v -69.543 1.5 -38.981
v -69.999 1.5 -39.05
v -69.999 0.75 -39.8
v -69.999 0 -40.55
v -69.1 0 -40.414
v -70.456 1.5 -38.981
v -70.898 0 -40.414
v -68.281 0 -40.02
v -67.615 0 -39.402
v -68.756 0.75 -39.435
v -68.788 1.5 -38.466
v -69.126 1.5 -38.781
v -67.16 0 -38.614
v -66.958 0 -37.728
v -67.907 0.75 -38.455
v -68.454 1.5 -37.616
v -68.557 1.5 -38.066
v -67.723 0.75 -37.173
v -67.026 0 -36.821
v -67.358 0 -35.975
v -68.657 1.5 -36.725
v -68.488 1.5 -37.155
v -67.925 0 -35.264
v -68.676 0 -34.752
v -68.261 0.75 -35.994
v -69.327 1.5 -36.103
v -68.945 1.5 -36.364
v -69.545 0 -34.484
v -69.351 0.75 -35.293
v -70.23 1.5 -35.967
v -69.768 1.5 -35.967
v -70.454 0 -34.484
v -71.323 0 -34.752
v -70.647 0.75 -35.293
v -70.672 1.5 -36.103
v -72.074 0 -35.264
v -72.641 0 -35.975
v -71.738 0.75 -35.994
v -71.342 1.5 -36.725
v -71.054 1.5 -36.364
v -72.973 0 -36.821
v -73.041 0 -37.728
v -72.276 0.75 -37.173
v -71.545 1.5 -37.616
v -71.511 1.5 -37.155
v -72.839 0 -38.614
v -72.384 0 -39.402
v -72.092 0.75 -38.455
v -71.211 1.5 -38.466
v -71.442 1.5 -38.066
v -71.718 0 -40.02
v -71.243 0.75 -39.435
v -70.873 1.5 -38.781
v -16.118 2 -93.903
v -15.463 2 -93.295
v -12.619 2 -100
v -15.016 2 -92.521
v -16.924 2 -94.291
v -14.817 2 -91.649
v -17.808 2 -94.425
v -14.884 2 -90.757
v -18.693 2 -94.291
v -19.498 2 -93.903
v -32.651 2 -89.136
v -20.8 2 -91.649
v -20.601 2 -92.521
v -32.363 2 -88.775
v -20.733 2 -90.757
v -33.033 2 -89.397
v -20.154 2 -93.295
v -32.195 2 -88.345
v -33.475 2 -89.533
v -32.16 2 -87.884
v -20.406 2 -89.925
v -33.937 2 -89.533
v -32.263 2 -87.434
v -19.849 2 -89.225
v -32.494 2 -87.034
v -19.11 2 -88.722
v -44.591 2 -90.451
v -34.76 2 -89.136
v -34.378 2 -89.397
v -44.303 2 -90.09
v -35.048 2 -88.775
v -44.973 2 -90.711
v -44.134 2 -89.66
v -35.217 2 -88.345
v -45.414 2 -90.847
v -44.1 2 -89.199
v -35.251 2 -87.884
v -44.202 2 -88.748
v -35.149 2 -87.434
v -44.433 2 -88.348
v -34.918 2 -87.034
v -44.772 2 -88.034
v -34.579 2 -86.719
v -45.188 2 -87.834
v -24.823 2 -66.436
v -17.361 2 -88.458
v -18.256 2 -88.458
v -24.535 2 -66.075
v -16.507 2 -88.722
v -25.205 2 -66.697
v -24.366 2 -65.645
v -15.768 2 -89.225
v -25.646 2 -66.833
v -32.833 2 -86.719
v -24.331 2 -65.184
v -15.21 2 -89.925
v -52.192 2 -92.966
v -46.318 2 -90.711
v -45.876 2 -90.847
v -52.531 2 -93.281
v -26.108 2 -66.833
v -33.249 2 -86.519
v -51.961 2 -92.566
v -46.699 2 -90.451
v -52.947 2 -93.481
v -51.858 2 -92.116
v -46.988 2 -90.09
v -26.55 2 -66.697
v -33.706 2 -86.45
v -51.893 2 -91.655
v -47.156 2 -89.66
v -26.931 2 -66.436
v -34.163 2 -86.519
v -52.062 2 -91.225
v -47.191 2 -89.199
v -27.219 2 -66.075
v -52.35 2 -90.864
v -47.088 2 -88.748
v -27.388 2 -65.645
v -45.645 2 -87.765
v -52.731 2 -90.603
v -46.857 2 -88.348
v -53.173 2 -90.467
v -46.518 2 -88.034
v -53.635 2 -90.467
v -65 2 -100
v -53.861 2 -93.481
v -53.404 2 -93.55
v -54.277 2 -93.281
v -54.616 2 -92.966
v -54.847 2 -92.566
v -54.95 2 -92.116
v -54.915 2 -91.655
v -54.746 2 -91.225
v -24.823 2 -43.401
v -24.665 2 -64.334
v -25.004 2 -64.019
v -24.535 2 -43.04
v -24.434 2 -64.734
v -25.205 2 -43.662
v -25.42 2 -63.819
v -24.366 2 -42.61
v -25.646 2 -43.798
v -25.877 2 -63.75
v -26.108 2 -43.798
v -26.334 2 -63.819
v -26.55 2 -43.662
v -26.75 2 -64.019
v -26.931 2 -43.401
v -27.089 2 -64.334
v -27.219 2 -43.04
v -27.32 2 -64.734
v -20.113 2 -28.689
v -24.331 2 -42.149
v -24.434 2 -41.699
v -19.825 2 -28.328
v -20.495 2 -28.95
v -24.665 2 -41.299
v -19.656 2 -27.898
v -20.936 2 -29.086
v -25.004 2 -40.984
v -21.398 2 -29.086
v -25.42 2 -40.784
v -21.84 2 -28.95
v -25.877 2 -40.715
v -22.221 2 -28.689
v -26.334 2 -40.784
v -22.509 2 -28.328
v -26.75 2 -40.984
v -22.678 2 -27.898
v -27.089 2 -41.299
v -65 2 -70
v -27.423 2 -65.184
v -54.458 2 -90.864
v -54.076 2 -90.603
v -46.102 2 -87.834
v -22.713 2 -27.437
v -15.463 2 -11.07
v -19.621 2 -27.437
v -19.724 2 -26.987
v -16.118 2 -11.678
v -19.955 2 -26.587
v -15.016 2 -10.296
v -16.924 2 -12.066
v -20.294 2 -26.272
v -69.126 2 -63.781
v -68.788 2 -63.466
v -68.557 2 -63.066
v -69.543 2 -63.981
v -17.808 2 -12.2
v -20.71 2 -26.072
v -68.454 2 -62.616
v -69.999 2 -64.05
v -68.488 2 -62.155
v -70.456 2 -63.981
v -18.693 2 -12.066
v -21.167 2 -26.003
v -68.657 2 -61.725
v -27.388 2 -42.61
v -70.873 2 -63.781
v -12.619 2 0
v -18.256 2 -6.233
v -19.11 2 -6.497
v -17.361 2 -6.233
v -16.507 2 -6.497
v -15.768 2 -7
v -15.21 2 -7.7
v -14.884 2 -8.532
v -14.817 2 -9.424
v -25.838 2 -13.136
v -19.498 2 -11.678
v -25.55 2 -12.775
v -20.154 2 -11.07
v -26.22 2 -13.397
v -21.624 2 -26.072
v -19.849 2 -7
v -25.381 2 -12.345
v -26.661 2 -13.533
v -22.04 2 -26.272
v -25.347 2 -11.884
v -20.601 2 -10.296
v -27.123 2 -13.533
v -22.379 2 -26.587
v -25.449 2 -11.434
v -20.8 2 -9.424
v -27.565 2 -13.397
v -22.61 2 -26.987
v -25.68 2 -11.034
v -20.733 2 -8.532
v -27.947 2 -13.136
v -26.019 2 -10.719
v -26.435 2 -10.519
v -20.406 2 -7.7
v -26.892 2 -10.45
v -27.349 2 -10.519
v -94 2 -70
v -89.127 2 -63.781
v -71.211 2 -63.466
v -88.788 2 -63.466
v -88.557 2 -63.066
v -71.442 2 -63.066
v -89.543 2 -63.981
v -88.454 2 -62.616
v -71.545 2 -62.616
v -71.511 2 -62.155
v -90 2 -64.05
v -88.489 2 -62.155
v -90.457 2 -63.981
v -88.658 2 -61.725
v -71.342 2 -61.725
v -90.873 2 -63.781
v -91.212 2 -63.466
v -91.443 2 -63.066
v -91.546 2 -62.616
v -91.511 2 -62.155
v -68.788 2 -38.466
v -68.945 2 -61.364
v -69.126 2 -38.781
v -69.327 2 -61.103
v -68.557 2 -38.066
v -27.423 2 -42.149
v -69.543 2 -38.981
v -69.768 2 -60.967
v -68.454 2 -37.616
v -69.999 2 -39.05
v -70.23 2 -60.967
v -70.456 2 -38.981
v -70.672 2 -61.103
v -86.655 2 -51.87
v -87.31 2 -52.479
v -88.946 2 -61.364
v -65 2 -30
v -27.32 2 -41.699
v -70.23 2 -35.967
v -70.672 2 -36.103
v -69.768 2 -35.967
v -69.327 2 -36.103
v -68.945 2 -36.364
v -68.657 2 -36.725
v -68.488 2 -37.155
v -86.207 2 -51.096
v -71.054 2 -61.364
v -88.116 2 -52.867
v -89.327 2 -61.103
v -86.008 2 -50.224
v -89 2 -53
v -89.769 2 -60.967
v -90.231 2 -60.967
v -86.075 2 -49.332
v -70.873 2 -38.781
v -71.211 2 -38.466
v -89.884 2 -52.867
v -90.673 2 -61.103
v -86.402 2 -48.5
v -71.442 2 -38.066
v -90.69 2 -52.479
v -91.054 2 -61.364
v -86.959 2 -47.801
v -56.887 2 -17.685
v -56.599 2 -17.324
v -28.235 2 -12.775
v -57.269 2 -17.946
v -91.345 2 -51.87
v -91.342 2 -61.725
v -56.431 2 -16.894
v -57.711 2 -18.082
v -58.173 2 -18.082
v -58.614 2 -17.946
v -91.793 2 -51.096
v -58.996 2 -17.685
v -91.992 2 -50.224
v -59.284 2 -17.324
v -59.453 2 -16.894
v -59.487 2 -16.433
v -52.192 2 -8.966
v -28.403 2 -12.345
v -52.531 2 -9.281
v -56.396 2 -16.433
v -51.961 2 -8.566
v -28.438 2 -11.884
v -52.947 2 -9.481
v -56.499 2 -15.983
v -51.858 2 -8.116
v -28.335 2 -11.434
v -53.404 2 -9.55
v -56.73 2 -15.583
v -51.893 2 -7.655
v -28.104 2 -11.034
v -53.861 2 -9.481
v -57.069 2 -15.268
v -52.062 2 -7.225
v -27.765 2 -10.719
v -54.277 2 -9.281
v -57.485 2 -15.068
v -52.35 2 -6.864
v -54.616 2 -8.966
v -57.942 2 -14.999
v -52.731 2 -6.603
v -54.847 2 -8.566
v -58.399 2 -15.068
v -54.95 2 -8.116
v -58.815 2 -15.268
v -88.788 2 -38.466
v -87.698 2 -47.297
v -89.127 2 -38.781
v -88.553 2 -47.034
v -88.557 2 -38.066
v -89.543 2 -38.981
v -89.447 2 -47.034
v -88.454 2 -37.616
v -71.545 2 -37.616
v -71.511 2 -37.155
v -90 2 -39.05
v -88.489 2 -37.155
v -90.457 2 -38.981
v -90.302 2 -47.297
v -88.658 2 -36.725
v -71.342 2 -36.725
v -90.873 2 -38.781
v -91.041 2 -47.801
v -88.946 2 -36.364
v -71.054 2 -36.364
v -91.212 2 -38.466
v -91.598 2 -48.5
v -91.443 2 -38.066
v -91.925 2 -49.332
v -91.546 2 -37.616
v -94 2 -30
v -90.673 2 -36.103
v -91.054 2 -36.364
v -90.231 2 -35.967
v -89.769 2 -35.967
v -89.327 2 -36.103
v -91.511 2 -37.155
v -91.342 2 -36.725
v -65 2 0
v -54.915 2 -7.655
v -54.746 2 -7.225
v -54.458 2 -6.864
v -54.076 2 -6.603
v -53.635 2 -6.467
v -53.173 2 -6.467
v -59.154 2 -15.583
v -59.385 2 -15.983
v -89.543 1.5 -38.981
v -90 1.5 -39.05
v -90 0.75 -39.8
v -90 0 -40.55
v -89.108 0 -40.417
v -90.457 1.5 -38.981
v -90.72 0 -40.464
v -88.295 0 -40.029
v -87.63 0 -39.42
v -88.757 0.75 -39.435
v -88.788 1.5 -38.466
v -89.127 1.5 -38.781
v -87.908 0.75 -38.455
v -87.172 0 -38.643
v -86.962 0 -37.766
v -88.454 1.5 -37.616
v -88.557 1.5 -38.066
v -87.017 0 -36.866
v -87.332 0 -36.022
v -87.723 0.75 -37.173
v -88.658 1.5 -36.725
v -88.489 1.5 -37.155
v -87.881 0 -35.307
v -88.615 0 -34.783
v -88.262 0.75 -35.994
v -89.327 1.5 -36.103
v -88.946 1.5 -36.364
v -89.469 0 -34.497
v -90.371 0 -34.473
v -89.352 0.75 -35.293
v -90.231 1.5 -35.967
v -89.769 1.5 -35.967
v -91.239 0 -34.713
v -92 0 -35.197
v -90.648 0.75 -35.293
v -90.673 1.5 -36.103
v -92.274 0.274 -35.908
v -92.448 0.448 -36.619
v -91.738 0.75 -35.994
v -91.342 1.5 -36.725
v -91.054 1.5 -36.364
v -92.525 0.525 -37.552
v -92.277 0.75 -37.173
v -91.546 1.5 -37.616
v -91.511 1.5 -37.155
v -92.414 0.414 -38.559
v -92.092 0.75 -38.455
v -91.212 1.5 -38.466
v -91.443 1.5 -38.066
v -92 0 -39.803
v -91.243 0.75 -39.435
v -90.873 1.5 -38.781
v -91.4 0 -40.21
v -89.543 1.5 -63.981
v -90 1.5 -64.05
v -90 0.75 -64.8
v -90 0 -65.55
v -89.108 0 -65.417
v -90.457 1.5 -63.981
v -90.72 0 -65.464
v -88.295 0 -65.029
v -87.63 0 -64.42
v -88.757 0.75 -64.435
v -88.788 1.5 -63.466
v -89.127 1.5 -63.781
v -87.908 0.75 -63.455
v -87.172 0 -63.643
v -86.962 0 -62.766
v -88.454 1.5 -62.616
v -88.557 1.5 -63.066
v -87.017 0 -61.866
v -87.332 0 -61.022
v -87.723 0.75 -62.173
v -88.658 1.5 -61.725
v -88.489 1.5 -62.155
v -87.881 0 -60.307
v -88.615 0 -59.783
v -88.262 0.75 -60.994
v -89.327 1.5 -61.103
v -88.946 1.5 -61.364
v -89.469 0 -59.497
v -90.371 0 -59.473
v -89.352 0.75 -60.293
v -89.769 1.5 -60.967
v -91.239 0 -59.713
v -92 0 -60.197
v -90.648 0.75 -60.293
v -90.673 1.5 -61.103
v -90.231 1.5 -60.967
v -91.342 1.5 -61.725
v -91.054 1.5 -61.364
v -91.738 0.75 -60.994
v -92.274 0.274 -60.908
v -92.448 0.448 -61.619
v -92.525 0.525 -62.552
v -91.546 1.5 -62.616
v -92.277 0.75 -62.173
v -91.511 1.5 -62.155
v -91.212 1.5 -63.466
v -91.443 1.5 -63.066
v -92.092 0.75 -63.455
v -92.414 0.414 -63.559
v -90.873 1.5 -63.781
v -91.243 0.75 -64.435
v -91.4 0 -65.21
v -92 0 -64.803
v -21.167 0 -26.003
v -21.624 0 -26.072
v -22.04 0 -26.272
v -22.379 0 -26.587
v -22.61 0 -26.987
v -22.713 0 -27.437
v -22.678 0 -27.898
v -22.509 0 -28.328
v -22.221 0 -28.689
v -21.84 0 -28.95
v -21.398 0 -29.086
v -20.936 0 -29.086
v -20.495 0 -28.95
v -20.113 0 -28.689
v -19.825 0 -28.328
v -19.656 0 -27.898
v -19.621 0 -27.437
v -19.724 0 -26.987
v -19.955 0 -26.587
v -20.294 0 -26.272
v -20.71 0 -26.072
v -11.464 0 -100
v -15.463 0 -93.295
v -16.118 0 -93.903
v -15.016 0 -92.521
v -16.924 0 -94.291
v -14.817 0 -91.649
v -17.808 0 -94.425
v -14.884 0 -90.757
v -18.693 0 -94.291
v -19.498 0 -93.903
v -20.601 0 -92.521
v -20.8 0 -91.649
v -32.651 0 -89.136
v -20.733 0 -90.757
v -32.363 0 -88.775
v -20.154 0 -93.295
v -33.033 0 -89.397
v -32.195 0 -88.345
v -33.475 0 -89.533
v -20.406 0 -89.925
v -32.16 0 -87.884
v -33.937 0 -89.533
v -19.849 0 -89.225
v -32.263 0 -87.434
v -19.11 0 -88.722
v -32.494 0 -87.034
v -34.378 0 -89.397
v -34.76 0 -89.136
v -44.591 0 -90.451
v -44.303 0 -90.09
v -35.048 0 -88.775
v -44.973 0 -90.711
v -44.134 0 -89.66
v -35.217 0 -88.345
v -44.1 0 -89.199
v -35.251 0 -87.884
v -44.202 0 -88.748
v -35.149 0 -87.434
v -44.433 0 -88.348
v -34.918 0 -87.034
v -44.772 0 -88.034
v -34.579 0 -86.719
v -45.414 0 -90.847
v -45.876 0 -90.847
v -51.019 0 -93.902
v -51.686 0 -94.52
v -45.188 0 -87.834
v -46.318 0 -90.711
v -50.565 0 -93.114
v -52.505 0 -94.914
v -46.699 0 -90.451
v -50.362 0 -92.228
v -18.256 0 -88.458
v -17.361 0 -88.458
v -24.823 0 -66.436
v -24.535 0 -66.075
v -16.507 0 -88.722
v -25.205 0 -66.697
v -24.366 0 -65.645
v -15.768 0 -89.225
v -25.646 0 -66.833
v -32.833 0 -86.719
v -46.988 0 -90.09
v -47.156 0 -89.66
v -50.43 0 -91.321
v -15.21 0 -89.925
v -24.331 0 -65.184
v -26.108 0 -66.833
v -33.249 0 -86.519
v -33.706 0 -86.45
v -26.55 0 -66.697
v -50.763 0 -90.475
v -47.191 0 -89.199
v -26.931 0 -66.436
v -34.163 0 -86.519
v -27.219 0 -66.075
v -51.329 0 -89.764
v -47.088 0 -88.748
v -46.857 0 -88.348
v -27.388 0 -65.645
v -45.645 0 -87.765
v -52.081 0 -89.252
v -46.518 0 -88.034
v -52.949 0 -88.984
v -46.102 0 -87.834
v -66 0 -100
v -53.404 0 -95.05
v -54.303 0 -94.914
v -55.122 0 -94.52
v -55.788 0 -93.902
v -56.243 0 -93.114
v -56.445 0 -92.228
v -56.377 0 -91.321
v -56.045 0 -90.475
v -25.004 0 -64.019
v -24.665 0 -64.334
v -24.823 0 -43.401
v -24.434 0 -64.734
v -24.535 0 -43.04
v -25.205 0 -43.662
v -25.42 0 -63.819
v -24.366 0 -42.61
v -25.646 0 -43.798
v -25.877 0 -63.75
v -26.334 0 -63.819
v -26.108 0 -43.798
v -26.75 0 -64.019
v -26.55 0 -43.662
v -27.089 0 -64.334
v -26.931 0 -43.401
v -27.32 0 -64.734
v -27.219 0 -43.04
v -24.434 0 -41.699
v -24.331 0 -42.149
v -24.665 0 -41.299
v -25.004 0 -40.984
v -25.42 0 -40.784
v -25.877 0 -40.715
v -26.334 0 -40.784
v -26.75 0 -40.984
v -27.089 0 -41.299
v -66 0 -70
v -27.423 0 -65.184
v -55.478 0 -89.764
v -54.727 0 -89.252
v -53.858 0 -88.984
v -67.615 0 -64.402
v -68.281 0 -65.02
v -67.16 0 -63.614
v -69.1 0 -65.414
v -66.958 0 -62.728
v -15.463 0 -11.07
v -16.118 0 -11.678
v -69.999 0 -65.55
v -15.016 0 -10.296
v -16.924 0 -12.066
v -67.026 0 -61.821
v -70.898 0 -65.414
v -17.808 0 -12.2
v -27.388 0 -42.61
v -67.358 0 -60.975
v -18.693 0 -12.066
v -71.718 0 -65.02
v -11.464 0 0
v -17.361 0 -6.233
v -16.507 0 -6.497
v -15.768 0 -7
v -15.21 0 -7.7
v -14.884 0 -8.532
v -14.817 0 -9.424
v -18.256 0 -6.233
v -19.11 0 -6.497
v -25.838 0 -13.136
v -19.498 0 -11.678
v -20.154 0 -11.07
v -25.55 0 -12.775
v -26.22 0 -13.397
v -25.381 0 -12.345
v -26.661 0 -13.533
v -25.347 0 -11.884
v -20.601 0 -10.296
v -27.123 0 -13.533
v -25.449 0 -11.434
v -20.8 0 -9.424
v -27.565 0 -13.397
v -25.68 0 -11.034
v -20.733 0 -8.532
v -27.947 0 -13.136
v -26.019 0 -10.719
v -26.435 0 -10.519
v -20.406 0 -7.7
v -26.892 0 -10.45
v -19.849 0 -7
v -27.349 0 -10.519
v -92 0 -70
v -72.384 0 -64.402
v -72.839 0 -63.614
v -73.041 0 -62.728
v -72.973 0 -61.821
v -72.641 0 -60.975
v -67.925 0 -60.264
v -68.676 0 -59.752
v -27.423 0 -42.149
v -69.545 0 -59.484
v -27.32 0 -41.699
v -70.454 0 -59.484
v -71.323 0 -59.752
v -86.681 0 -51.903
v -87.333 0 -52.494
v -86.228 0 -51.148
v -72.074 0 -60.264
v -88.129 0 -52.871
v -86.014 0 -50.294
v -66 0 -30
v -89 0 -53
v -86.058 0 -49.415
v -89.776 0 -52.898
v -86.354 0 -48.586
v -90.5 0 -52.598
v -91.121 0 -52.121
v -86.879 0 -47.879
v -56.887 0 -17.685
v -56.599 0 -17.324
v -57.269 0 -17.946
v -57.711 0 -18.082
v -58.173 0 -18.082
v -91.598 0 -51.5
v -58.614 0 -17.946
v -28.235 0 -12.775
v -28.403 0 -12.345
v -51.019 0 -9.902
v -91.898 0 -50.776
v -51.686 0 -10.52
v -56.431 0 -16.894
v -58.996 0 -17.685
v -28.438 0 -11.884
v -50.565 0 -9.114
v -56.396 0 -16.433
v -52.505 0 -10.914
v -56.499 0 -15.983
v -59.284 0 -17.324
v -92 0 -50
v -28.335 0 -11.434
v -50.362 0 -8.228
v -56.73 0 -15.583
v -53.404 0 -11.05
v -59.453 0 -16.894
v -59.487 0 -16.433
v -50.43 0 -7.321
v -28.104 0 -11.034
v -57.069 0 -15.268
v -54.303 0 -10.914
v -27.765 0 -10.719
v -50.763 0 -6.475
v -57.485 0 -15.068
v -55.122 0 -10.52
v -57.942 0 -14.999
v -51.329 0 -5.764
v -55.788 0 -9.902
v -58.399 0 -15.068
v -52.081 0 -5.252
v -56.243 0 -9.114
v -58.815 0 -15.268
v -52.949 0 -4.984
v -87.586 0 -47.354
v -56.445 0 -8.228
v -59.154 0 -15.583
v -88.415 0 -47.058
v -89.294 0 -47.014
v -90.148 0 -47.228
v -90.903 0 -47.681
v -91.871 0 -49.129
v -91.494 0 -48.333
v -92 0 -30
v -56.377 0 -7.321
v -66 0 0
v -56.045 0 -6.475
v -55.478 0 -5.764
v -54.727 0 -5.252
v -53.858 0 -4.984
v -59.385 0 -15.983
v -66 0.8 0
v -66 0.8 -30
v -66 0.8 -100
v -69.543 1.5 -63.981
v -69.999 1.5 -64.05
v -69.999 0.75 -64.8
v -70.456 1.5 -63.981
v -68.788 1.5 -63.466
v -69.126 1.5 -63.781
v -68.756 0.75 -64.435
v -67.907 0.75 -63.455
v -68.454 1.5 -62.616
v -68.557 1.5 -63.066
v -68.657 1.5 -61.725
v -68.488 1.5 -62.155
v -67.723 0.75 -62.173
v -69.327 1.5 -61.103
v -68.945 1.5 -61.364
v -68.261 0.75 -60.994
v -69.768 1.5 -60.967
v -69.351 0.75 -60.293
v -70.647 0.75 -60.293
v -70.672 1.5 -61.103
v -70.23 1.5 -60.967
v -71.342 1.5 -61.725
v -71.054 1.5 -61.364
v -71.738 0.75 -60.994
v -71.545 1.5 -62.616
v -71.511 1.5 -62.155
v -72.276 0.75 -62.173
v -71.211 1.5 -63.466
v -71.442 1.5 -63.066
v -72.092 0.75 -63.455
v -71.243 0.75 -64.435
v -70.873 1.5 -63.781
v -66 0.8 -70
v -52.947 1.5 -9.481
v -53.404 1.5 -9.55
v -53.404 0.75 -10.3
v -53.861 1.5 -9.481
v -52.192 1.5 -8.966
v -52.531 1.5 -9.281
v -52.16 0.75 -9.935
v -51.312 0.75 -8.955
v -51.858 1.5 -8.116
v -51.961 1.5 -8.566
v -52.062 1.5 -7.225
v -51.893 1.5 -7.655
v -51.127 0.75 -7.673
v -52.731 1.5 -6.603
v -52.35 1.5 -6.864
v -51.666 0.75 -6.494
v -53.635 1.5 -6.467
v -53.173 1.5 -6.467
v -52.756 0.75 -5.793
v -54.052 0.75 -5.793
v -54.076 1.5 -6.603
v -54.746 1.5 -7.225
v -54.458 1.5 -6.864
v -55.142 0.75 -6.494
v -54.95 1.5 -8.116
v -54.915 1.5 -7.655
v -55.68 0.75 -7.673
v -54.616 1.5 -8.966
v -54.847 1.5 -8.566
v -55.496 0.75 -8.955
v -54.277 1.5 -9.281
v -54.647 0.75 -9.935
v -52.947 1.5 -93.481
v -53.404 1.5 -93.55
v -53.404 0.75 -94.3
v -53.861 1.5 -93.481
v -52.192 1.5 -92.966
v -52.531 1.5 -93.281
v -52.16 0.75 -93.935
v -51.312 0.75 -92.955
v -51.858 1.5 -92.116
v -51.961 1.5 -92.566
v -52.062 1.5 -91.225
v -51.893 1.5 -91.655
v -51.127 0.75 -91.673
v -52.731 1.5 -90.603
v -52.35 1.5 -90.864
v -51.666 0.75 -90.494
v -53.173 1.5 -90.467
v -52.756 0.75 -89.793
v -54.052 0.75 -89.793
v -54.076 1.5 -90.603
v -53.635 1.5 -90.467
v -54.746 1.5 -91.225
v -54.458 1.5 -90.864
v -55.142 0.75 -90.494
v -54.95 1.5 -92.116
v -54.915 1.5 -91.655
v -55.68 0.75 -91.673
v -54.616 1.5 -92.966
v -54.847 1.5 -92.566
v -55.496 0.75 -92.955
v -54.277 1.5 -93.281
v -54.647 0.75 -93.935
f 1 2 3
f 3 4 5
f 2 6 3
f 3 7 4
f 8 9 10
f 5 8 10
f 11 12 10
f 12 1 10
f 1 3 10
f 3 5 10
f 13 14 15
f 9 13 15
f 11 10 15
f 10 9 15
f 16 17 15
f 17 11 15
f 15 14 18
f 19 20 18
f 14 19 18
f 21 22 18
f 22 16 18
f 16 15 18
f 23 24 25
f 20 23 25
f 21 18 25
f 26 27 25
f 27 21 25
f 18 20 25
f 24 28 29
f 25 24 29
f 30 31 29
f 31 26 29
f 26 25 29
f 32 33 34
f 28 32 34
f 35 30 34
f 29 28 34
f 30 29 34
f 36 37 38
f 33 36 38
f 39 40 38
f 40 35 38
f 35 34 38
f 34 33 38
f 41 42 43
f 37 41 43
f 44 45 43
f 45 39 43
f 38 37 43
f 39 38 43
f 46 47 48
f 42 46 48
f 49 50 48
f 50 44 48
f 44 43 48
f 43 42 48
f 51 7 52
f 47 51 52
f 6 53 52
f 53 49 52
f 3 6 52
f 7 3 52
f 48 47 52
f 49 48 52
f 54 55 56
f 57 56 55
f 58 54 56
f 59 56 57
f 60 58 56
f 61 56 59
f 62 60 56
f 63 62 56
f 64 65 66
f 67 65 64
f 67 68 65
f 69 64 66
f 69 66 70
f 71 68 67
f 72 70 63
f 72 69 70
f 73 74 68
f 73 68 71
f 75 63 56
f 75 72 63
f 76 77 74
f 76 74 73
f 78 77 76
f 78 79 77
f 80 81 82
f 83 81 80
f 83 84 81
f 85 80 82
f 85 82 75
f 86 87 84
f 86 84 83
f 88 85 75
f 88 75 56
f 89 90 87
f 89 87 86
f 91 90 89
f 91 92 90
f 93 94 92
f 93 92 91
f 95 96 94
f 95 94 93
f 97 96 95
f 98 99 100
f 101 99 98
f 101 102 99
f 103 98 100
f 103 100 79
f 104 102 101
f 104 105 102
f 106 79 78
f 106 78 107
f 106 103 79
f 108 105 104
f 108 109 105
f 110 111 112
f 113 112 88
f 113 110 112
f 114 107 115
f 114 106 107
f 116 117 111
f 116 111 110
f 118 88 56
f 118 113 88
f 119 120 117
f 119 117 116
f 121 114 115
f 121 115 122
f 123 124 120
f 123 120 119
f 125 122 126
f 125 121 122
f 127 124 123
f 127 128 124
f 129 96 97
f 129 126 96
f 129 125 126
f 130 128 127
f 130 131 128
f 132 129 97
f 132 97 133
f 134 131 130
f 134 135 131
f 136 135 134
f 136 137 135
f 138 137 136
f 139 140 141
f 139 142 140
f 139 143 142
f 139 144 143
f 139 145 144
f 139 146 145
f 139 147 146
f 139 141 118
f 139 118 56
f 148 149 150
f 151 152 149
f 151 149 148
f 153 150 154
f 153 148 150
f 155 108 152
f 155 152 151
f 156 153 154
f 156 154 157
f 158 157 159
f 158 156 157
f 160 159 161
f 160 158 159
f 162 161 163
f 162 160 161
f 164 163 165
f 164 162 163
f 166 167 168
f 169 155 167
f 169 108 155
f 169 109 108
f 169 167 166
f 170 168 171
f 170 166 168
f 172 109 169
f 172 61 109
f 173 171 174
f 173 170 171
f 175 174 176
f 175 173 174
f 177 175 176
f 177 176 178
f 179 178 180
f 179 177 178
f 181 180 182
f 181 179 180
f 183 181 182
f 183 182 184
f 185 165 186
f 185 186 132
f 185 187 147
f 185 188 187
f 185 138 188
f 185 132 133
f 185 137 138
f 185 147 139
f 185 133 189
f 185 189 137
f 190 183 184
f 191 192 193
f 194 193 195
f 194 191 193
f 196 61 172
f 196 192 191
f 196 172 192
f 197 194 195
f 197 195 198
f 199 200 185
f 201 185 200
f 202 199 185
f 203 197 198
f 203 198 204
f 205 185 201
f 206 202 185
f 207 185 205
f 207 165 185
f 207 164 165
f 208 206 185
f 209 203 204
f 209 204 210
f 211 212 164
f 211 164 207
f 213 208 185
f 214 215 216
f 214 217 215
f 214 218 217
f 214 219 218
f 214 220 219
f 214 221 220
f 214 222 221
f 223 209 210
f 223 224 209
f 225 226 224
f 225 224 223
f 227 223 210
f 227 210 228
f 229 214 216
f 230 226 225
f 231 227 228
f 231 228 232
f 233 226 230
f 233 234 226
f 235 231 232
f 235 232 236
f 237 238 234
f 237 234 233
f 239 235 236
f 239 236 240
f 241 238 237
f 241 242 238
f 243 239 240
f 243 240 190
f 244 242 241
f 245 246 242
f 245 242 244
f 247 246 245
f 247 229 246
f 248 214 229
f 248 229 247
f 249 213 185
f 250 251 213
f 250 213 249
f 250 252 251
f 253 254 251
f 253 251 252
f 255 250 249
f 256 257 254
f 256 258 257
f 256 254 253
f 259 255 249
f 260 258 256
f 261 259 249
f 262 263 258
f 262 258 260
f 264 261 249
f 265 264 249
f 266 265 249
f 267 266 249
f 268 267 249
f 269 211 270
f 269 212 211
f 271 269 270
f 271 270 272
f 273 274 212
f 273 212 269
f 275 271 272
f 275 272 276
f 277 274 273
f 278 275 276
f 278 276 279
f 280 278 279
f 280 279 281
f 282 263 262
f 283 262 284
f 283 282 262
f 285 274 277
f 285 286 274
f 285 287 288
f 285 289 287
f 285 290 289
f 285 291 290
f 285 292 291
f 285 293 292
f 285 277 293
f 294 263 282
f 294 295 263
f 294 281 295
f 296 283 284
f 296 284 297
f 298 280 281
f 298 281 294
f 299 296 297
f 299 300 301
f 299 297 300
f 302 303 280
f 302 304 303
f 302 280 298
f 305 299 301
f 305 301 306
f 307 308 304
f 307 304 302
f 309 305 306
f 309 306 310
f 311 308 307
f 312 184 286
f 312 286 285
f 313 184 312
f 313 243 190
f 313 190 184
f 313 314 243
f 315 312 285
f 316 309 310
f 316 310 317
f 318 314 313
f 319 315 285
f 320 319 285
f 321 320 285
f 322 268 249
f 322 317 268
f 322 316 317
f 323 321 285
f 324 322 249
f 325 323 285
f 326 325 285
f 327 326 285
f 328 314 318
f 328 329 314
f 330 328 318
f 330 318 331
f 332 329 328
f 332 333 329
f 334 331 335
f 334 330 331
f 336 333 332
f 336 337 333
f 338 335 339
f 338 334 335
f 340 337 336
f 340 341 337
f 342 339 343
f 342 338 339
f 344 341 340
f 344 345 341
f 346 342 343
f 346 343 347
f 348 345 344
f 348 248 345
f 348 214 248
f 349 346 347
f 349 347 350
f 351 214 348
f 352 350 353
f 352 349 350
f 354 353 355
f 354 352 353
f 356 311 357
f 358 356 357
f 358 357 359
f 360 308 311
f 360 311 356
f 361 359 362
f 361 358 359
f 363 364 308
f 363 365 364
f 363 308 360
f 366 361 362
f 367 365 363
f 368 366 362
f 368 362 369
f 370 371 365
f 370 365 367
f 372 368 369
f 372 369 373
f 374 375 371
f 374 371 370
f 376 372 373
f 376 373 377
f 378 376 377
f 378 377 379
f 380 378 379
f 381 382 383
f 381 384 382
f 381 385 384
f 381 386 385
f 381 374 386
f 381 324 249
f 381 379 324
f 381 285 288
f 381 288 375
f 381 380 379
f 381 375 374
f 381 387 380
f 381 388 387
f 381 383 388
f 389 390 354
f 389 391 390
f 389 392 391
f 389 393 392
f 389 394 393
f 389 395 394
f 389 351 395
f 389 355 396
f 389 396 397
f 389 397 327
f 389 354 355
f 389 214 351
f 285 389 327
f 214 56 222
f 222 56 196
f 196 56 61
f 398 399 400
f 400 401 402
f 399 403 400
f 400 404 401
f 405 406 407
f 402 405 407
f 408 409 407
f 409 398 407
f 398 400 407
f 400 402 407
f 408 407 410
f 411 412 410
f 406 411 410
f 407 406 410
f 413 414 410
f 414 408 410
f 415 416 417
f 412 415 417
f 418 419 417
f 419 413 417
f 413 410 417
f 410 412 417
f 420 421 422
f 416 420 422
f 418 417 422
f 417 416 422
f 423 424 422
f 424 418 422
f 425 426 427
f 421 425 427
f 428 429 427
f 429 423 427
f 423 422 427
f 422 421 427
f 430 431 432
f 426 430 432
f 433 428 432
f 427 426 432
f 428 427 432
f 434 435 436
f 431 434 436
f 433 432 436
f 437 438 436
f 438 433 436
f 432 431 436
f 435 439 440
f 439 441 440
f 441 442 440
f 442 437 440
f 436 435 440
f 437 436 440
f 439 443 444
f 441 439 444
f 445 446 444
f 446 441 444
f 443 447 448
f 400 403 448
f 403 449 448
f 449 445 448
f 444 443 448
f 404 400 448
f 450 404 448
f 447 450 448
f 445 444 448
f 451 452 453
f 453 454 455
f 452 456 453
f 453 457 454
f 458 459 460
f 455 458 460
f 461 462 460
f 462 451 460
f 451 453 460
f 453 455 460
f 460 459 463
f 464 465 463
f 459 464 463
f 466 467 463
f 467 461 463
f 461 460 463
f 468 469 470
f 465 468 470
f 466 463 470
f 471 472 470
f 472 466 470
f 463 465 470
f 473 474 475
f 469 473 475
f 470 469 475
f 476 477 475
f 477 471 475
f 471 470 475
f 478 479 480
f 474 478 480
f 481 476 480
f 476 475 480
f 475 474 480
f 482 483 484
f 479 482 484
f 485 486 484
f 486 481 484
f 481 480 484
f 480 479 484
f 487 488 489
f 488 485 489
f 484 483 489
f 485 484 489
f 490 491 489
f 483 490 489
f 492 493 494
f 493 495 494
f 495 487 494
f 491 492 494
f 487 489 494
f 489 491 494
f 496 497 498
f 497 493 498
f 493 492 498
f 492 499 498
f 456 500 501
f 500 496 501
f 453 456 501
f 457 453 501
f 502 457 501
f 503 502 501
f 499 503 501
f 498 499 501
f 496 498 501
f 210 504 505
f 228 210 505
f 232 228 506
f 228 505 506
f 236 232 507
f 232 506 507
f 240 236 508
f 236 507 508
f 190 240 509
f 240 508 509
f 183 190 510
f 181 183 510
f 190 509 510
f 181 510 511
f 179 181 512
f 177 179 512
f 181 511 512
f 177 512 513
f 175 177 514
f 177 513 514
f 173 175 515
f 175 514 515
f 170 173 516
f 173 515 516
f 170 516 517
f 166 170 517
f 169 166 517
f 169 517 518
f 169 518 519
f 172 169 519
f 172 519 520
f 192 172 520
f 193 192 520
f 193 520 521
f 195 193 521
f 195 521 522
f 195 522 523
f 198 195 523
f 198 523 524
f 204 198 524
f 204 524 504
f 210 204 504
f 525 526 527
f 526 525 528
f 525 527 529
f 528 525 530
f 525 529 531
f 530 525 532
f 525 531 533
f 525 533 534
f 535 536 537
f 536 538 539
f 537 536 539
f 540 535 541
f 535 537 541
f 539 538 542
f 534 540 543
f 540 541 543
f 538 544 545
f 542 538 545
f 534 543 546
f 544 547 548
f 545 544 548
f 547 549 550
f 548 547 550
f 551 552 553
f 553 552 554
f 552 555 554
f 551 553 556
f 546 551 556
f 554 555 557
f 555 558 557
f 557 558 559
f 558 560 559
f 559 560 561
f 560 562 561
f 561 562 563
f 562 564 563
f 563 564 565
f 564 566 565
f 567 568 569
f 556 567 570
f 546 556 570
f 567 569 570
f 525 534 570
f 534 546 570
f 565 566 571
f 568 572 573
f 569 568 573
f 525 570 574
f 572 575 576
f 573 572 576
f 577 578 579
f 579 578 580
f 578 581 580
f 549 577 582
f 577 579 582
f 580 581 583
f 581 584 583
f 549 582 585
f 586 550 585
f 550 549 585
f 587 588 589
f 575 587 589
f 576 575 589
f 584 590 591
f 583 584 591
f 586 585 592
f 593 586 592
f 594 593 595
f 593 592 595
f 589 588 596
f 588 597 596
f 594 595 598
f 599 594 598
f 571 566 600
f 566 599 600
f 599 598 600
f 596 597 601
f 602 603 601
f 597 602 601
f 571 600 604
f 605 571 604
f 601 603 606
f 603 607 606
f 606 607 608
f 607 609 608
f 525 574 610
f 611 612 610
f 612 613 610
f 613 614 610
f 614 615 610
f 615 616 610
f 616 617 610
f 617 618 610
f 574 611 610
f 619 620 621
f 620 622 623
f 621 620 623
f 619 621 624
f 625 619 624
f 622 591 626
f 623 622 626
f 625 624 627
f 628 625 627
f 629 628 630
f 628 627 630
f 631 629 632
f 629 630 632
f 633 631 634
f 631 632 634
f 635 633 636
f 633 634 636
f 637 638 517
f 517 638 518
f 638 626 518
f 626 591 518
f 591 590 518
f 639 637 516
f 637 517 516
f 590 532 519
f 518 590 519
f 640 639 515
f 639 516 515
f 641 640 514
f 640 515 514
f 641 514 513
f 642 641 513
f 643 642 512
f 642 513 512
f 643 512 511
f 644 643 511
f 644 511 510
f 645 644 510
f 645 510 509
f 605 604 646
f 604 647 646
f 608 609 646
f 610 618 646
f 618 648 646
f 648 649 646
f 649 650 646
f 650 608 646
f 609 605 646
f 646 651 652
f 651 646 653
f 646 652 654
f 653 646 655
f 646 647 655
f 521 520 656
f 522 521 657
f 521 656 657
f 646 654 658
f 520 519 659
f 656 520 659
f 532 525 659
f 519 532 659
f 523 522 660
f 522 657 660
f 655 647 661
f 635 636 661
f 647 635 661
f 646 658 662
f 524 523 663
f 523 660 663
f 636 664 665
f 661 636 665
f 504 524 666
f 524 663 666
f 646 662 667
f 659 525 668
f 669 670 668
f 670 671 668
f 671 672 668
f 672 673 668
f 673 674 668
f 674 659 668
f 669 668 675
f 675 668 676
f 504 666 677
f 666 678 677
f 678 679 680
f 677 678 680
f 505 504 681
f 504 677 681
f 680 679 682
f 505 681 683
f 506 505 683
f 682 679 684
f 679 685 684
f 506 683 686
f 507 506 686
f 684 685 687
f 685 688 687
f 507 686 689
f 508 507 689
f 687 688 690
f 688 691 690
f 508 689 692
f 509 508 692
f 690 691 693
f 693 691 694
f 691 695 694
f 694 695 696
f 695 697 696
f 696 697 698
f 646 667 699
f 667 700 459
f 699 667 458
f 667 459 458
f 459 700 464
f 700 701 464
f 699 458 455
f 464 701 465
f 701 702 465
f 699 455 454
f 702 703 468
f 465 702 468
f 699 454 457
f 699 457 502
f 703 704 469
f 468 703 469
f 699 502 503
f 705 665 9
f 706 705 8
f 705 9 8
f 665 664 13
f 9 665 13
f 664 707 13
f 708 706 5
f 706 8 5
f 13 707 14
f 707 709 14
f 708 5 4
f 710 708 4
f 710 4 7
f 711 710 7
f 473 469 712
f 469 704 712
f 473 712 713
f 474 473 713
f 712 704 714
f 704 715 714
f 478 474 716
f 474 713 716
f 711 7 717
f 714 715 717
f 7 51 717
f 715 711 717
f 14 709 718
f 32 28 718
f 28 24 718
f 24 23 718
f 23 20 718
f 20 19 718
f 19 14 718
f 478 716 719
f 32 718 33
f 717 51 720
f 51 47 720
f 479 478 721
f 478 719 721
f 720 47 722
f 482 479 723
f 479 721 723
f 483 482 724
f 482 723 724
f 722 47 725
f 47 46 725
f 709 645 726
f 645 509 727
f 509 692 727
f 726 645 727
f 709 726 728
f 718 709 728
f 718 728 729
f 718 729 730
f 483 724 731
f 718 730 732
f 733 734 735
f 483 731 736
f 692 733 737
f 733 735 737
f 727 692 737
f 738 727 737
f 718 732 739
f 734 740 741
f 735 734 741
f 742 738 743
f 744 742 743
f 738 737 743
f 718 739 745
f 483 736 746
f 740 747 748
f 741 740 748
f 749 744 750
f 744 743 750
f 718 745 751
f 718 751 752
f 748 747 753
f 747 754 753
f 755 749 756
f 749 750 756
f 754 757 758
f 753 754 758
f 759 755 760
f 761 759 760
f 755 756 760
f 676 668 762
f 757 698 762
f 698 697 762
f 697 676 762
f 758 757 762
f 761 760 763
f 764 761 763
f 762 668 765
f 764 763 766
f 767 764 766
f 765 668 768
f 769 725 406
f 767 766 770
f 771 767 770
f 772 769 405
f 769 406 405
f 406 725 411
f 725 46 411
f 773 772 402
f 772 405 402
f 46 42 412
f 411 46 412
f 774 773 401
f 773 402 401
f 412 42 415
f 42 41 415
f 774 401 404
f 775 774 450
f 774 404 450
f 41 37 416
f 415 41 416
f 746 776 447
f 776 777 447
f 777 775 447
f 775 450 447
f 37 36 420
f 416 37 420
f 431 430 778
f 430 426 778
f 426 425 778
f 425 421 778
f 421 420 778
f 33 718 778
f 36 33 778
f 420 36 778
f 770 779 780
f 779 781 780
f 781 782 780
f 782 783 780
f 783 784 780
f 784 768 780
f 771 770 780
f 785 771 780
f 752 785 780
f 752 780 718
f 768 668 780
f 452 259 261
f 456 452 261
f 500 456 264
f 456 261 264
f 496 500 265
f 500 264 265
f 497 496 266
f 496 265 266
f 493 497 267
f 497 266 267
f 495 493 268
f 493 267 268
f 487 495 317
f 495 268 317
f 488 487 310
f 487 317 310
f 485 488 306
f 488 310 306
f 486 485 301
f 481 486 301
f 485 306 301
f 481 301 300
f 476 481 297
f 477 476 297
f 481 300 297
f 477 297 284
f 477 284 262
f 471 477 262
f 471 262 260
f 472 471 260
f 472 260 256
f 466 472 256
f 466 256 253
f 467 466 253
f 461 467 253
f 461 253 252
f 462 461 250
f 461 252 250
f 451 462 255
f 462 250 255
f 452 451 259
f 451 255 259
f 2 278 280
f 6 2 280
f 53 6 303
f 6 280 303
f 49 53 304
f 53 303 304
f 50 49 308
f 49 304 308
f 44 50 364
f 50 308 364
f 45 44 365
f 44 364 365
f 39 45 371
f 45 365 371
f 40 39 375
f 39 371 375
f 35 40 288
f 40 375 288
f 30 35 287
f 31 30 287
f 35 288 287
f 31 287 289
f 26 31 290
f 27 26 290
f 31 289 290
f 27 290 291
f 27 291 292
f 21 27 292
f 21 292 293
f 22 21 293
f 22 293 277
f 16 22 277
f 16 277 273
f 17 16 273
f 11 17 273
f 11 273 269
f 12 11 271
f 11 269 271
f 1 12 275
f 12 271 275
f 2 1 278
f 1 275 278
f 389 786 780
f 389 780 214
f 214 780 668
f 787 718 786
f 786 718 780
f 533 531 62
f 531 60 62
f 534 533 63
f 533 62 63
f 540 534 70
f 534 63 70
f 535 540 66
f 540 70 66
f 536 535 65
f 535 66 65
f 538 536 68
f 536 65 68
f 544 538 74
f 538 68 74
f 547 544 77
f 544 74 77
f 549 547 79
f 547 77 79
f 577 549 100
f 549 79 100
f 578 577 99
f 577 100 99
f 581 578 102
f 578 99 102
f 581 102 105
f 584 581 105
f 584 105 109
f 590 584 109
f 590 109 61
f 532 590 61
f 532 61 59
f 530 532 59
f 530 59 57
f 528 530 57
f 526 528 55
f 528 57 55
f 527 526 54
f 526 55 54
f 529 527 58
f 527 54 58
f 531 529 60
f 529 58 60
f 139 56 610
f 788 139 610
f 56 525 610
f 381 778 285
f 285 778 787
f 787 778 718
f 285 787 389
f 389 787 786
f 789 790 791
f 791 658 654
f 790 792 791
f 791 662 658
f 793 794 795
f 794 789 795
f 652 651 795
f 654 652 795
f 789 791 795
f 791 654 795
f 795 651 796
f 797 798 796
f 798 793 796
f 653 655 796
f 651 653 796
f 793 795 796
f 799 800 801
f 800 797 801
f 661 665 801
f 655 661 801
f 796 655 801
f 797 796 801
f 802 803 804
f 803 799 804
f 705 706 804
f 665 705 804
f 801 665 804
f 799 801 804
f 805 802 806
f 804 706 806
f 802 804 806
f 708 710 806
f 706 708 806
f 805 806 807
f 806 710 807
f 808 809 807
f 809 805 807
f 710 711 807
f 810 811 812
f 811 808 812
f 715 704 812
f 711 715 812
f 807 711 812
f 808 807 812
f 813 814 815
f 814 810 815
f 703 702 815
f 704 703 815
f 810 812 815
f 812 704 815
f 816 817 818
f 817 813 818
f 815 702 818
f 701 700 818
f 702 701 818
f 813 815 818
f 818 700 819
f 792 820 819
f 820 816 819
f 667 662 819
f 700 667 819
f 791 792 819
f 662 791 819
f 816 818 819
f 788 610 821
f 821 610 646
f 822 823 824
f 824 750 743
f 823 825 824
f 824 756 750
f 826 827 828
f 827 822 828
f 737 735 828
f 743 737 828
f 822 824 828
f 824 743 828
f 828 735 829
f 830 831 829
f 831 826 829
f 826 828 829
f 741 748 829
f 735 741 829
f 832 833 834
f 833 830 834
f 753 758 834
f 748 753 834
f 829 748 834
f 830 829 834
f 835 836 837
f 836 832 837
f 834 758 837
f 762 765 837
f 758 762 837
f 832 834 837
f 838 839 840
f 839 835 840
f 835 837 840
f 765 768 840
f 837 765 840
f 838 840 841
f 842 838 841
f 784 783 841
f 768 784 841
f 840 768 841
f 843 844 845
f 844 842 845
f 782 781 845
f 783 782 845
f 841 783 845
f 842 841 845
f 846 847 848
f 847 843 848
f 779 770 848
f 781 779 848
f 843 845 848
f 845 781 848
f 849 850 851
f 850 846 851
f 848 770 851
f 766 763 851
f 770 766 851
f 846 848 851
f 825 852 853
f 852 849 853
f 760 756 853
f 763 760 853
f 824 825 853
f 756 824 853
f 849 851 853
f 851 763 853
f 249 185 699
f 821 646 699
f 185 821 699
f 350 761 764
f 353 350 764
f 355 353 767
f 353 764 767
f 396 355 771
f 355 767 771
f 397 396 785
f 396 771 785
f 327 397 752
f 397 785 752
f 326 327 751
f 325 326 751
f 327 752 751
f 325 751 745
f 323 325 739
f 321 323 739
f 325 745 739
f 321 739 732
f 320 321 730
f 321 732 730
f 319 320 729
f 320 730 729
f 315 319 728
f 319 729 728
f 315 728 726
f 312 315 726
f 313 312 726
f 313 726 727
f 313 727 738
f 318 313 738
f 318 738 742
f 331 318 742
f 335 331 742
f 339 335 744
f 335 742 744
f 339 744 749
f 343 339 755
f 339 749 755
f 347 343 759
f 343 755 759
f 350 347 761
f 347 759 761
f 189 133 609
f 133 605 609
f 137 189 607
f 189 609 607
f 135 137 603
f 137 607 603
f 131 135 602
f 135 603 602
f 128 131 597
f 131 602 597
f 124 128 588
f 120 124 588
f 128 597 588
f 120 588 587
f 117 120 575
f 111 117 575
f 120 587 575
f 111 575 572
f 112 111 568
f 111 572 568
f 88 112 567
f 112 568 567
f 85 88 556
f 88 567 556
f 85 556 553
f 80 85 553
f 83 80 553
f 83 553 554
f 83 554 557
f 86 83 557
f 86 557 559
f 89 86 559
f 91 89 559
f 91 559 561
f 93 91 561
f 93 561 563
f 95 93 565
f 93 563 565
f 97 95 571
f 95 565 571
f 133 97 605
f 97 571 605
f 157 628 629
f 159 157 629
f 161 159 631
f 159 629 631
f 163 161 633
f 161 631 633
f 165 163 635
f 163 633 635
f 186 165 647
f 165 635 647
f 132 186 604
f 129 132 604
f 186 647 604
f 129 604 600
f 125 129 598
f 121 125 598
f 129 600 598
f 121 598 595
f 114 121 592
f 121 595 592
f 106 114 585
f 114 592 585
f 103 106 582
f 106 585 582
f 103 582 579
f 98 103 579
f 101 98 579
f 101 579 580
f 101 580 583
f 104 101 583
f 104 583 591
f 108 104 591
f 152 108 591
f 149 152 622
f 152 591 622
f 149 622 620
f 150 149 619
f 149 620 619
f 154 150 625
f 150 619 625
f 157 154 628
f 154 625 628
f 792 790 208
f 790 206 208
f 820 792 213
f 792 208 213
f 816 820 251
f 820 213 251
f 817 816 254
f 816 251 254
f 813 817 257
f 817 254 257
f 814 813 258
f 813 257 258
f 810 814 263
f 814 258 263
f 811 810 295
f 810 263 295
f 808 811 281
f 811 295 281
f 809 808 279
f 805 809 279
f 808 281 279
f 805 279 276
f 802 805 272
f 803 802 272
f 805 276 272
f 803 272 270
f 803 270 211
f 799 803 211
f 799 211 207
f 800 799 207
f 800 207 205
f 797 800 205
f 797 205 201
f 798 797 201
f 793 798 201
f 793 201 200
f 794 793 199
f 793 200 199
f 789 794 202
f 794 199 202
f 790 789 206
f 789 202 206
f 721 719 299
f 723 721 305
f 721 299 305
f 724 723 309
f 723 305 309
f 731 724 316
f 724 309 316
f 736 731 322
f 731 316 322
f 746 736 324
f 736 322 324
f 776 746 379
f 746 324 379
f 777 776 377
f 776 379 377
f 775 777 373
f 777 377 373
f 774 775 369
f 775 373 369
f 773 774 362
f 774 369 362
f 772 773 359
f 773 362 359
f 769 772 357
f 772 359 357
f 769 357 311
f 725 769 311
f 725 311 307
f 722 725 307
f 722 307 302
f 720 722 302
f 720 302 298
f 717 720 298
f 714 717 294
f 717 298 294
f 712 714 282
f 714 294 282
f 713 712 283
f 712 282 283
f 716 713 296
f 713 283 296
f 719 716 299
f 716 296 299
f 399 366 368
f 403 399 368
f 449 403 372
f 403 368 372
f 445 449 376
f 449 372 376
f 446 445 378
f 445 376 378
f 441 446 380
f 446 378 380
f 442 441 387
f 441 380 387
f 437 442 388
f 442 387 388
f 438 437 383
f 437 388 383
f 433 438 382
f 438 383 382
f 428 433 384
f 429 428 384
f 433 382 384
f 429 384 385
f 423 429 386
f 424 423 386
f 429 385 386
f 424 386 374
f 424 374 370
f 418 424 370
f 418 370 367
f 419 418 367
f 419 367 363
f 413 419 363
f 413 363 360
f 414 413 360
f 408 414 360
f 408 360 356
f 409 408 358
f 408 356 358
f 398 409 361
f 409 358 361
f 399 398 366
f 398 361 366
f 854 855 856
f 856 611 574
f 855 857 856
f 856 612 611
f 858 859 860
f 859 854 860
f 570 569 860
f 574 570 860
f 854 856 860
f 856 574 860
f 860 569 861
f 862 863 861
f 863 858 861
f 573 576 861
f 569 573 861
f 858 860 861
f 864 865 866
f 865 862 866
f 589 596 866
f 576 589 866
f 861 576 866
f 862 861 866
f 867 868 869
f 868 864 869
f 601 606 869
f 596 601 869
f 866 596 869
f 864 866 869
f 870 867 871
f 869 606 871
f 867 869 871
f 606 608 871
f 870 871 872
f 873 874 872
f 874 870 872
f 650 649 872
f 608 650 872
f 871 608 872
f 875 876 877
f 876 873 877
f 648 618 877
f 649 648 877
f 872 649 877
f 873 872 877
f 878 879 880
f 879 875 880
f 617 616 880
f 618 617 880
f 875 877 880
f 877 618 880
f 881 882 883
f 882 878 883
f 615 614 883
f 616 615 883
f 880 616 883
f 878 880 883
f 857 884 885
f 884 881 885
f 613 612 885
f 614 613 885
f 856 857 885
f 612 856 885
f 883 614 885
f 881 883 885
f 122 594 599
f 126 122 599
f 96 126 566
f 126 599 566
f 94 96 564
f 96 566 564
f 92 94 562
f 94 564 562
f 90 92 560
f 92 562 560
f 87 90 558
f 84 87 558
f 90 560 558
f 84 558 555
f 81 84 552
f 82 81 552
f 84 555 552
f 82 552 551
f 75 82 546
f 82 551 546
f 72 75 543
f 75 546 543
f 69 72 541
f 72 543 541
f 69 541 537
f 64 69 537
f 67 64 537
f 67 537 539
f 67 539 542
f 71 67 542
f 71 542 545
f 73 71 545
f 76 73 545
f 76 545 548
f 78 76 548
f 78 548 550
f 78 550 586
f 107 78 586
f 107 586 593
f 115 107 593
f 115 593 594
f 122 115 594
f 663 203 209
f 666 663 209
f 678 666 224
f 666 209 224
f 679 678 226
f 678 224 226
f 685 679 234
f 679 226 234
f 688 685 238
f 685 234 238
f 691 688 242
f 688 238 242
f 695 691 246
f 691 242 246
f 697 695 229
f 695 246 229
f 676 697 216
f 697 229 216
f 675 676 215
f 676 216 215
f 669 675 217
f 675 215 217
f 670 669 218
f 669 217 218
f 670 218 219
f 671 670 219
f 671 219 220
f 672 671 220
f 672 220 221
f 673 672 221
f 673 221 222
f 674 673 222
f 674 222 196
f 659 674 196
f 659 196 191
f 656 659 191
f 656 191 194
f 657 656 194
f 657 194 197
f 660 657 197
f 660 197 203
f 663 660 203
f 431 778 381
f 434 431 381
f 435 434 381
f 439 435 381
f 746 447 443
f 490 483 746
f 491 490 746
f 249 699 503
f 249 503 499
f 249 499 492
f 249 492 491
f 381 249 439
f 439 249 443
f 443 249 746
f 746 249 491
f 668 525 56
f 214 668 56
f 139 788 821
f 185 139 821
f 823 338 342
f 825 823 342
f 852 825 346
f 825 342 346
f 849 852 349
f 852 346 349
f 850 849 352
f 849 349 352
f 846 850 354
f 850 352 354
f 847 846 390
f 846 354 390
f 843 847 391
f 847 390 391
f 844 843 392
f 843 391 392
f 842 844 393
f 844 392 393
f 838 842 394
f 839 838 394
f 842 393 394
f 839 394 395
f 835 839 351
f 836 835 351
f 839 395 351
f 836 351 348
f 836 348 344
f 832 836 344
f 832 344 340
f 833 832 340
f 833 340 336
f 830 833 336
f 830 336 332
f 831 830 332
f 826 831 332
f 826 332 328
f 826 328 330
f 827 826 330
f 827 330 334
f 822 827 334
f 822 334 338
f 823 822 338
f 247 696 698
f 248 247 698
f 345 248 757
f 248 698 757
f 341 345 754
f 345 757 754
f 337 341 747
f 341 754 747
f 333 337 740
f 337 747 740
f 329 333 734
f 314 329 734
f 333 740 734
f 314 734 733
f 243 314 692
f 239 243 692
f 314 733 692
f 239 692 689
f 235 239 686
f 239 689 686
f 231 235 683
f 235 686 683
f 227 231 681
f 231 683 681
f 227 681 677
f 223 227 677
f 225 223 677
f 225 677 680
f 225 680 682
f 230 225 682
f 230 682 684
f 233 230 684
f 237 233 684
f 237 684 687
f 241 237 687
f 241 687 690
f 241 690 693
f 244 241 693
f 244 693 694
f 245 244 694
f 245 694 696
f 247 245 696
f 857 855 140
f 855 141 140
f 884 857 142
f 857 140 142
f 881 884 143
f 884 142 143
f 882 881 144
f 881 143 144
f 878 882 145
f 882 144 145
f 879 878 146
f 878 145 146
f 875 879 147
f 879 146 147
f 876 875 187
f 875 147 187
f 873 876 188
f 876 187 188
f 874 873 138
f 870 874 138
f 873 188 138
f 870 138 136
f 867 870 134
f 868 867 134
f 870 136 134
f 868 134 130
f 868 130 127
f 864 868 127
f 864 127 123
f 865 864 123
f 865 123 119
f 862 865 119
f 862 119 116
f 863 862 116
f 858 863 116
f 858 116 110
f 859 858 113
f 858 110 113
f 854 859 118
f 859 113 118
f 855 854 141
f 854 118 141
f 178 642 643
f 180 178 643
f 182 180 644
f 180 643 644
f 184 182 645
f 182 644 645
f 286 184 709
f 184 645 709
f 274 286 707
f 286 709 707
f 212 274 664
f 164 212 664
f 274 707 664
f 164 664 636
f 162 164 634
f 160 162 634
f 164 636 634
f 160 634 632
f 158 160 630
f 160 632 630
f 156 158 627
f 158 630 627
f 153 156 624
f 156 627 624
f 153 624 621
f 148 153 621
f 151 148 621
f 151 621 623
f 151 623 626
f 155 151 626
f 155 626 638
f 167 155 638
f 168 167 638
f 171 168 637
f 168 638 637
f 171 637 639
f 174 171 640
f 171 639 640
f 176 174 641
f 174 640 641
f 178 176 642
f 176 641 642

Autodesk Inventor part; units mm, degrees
ref_plane "YZ Plane" through (0, 0, 0) normal (1, 0, 0) x (0, 1, 0)
ref_plane "XZ Plane" through (0, 0, 0) normal (0, 1, 0) x (-1, 0, 0)
sketch "Sketch1" plane through (0, 0, 0) normal (0, 1, 0) x (-1, 0, 0)
  line L0 (0, 0) -> (0, -100)
  line L1 (0, -100) -> (66, -100)
  line L2 (66, -100) -> (66, -70)
  line L3 (66, -70) -> (94, -70)
  line L4 (94, -70) -> (94, -30)
  line L5 (94, -30) -> (66, -30)
  line L6 (66, -30) -> (66, 0)
  line L7 (66, 0) -> (0, 0)
  dimension "d0" = 100
  dimension "d2" = 30
  dimension "d4" = 40
  dimension "d7" = 66
  dimension "d27" = 94
extrude "Extrusion1" add sketch "Sketch1" along normal blind 2
ref_plane "Work Plane1" through (-66, 0, -50) normal (0, 0, 1) x (1, 0, 0)
sketch "Sketch2" plane through (0, 0, 0) normal (0, -1, 0) x (1, 0, 0)
  point P0 (0, 0)
  point P1 (-69.9994, -37.5)
  point P2 (-90, -37.5)
  point P3 (-69.9994, -62.5)
  point P4 (-90, -62.5)
hole "Hole1" at (-90, 0, -37.5) at (-69.9994, 0, -37.5) at (-69.9994, 0, -62.5) at (-90, 0, -62.5) direction (0, 1, 0) diameter 3.1 end through all
chamfer "Chamfer1" distance 1.5 angle 45 4 edges at (-90, 0, -60.95) (-69.9994, 0, -60.95) (-69.9994, 0, -35.95) (-90, 0, -35.95) measured on face at (-22.8202, 0, -45.8956)
chamfer "Chamfer2" distance 2 angle 45 1 edges at (-94, 0, -50)
sketch "Sketch3" plane through (-66, 0, -50) normal (0, 0, 1) x (1, 0, 0)
  line L0 (66, -6) -> (58, -6)
  line L1 (58, -6) -> (45.307, 15.985)
  line L2 (66, 0) -> (66, 2) projected
  line L3 (0, 0) -> (66, 0) projected
  line L4 (45.307, 15.985) -> (66, 15.985)
  line L5 (66, 15.985) -> (66, -6)
  line L6 (66, -6) -> (66, -6)
  point P0 (66, 1)
  dimension "d22" = 8
  dimension "d23" = 120
  dimension "d24" = 6
extrude "Extrusion2" cut sketch "Sketch3" along normal through all both and the other way through all
chamfer "Chamfer3" distance 1 distance2 1.2 2 edges at (-66, 2, -15) (-66, 2, -85) measured on face at (-31.2626, 2, -46.0165)
sketch "Sketch4" plane through (0, 0, 0) normal (0, -1, 0) x (1, 0, 0)
  line L0 (-67.7565, -100) -> (-11.4641, -100)
  line L1 (-11.4641, -100) -> (-11.4641, 0)
  line L2 (-11.4641, 0) -> (-67.7565, 0)
  point P0 (0, 0)
  point P1 (-53.4039, -92)
  point P2 (-53.4039, -8)
  point P3 (-11.4641, 0)
  dimension "d31" = 8
  dimension "d32" = 41.9398
  dimension "d33" = 41.9398
  dimension "d34" = 8
  dimension "d35" = 100
hole "Hole2" at (-53.4039, 0, -92) at (-53.4039, 0, -8) direction (0, 1, 0) diameter 3.1 end through all
chamfer "Chamfer4" distance 1.5 angle 45 2 edges at (-53.4039, 0, -90.45) (-53.4039, 0, -6.45) measured on face at (-29.9666, 0, -45.9559)
sketch "Sketch6" plane through (0, 2, 0) normal (0, 1, 0) x (1, 0, 0)
  line L0 (-11.4641, 100) -> (-11.4641, 0) projected
  line L1 (-12.6188, 100) -> (-11.4641, 100) projected
  line L2 (-12.6188, 0) -> (-12.6188, 100) projected
  line L3 (-11.4641, 0) -> (-12.6188, 0) projected
  line L4 (-12.6188, 100) -> (-65, 100) projected
  line L5 (-65, 0) -> (-12.6188, 0) projected
  line L6 (-12.6715, 100) -> (-66, 100)
  line L7 (-11.4641, 100) -> (-11.4641, 39.7608)
  point P0 (-25.8771, 42.265)
  point P1 (-25.8771, 65.3)
  point P2 (-33.7057, 88)
  point P3 (-26.8923, 12)
  dimension "d56" = 34.7
  dimension "d57" = 42.265
  dimension "d83" = 21.0869
  dimension "d84" = 12
  dimension "d85" = 12
  dimension "d87" = 14.2735
  dimension "d88" = 14.413
  dimension "d89" = 14.413
hole "Hole3" at (-33.7057, 2, -88) at (-25.8771, 2, -65.3) at (-25.8771, 2, -42.265) at (-26.8923, 2, -12) direction (0, -1, 0) diameter 3.1 end through all
sketch "Sketch7" plane through (0, 0, 0) normal (0, -1, 0) x (1, 0, 0)
  point P0 (0, 0)
sketch "Sketch8" plane through (0, 0, 0) normal (0, -1, 0) x (1, 0, 0)
  point P0 (0, 0)
  point P1 (-17.8084, -91.4246)
  point P2 (-17.8084, -9.1996)
  point P3 (-89, -50)
  point P4 (-17.8084, -9.1996)
  point P5 (-17.8084, -91.4246)
  point P6 (-89, -50)
hole "Hole4" at (-17.8084, 0, -9.1996) at (-17.8084, 0, -91.4246) at (-89, 0, -50) direction (0, 1, 0) diameter 6 end through all
sketch "Sketch10" plane through (0, 2, 0) normal (0, 1, 0) x (1, 0, 0)
  line L0 (-65, 0) -> (-12.6188, 0) projected
  line L1 (-11.4641, 100) -> (-11.4641, 0) projected
  point P0 (0, 0)
  point P1 (-57.9417, 16.5491)
  point P2 (-57.9417, 16.5491)
  point P3 (-45.6452, 89.3147)
  point P4 (-21.1671, 27.553)
  dimension "d91" = 9.703
  dimension "d92" = 27.553
hole "Hole6" at (-21.1671, 2, -27.553) at (-45.6452, 2, -89.3147) at (-57.9417, 2, -16.5491) direction (0, -1, 0) diameter 3.1 end through all
properties part number "podstawa" material "Steel"
